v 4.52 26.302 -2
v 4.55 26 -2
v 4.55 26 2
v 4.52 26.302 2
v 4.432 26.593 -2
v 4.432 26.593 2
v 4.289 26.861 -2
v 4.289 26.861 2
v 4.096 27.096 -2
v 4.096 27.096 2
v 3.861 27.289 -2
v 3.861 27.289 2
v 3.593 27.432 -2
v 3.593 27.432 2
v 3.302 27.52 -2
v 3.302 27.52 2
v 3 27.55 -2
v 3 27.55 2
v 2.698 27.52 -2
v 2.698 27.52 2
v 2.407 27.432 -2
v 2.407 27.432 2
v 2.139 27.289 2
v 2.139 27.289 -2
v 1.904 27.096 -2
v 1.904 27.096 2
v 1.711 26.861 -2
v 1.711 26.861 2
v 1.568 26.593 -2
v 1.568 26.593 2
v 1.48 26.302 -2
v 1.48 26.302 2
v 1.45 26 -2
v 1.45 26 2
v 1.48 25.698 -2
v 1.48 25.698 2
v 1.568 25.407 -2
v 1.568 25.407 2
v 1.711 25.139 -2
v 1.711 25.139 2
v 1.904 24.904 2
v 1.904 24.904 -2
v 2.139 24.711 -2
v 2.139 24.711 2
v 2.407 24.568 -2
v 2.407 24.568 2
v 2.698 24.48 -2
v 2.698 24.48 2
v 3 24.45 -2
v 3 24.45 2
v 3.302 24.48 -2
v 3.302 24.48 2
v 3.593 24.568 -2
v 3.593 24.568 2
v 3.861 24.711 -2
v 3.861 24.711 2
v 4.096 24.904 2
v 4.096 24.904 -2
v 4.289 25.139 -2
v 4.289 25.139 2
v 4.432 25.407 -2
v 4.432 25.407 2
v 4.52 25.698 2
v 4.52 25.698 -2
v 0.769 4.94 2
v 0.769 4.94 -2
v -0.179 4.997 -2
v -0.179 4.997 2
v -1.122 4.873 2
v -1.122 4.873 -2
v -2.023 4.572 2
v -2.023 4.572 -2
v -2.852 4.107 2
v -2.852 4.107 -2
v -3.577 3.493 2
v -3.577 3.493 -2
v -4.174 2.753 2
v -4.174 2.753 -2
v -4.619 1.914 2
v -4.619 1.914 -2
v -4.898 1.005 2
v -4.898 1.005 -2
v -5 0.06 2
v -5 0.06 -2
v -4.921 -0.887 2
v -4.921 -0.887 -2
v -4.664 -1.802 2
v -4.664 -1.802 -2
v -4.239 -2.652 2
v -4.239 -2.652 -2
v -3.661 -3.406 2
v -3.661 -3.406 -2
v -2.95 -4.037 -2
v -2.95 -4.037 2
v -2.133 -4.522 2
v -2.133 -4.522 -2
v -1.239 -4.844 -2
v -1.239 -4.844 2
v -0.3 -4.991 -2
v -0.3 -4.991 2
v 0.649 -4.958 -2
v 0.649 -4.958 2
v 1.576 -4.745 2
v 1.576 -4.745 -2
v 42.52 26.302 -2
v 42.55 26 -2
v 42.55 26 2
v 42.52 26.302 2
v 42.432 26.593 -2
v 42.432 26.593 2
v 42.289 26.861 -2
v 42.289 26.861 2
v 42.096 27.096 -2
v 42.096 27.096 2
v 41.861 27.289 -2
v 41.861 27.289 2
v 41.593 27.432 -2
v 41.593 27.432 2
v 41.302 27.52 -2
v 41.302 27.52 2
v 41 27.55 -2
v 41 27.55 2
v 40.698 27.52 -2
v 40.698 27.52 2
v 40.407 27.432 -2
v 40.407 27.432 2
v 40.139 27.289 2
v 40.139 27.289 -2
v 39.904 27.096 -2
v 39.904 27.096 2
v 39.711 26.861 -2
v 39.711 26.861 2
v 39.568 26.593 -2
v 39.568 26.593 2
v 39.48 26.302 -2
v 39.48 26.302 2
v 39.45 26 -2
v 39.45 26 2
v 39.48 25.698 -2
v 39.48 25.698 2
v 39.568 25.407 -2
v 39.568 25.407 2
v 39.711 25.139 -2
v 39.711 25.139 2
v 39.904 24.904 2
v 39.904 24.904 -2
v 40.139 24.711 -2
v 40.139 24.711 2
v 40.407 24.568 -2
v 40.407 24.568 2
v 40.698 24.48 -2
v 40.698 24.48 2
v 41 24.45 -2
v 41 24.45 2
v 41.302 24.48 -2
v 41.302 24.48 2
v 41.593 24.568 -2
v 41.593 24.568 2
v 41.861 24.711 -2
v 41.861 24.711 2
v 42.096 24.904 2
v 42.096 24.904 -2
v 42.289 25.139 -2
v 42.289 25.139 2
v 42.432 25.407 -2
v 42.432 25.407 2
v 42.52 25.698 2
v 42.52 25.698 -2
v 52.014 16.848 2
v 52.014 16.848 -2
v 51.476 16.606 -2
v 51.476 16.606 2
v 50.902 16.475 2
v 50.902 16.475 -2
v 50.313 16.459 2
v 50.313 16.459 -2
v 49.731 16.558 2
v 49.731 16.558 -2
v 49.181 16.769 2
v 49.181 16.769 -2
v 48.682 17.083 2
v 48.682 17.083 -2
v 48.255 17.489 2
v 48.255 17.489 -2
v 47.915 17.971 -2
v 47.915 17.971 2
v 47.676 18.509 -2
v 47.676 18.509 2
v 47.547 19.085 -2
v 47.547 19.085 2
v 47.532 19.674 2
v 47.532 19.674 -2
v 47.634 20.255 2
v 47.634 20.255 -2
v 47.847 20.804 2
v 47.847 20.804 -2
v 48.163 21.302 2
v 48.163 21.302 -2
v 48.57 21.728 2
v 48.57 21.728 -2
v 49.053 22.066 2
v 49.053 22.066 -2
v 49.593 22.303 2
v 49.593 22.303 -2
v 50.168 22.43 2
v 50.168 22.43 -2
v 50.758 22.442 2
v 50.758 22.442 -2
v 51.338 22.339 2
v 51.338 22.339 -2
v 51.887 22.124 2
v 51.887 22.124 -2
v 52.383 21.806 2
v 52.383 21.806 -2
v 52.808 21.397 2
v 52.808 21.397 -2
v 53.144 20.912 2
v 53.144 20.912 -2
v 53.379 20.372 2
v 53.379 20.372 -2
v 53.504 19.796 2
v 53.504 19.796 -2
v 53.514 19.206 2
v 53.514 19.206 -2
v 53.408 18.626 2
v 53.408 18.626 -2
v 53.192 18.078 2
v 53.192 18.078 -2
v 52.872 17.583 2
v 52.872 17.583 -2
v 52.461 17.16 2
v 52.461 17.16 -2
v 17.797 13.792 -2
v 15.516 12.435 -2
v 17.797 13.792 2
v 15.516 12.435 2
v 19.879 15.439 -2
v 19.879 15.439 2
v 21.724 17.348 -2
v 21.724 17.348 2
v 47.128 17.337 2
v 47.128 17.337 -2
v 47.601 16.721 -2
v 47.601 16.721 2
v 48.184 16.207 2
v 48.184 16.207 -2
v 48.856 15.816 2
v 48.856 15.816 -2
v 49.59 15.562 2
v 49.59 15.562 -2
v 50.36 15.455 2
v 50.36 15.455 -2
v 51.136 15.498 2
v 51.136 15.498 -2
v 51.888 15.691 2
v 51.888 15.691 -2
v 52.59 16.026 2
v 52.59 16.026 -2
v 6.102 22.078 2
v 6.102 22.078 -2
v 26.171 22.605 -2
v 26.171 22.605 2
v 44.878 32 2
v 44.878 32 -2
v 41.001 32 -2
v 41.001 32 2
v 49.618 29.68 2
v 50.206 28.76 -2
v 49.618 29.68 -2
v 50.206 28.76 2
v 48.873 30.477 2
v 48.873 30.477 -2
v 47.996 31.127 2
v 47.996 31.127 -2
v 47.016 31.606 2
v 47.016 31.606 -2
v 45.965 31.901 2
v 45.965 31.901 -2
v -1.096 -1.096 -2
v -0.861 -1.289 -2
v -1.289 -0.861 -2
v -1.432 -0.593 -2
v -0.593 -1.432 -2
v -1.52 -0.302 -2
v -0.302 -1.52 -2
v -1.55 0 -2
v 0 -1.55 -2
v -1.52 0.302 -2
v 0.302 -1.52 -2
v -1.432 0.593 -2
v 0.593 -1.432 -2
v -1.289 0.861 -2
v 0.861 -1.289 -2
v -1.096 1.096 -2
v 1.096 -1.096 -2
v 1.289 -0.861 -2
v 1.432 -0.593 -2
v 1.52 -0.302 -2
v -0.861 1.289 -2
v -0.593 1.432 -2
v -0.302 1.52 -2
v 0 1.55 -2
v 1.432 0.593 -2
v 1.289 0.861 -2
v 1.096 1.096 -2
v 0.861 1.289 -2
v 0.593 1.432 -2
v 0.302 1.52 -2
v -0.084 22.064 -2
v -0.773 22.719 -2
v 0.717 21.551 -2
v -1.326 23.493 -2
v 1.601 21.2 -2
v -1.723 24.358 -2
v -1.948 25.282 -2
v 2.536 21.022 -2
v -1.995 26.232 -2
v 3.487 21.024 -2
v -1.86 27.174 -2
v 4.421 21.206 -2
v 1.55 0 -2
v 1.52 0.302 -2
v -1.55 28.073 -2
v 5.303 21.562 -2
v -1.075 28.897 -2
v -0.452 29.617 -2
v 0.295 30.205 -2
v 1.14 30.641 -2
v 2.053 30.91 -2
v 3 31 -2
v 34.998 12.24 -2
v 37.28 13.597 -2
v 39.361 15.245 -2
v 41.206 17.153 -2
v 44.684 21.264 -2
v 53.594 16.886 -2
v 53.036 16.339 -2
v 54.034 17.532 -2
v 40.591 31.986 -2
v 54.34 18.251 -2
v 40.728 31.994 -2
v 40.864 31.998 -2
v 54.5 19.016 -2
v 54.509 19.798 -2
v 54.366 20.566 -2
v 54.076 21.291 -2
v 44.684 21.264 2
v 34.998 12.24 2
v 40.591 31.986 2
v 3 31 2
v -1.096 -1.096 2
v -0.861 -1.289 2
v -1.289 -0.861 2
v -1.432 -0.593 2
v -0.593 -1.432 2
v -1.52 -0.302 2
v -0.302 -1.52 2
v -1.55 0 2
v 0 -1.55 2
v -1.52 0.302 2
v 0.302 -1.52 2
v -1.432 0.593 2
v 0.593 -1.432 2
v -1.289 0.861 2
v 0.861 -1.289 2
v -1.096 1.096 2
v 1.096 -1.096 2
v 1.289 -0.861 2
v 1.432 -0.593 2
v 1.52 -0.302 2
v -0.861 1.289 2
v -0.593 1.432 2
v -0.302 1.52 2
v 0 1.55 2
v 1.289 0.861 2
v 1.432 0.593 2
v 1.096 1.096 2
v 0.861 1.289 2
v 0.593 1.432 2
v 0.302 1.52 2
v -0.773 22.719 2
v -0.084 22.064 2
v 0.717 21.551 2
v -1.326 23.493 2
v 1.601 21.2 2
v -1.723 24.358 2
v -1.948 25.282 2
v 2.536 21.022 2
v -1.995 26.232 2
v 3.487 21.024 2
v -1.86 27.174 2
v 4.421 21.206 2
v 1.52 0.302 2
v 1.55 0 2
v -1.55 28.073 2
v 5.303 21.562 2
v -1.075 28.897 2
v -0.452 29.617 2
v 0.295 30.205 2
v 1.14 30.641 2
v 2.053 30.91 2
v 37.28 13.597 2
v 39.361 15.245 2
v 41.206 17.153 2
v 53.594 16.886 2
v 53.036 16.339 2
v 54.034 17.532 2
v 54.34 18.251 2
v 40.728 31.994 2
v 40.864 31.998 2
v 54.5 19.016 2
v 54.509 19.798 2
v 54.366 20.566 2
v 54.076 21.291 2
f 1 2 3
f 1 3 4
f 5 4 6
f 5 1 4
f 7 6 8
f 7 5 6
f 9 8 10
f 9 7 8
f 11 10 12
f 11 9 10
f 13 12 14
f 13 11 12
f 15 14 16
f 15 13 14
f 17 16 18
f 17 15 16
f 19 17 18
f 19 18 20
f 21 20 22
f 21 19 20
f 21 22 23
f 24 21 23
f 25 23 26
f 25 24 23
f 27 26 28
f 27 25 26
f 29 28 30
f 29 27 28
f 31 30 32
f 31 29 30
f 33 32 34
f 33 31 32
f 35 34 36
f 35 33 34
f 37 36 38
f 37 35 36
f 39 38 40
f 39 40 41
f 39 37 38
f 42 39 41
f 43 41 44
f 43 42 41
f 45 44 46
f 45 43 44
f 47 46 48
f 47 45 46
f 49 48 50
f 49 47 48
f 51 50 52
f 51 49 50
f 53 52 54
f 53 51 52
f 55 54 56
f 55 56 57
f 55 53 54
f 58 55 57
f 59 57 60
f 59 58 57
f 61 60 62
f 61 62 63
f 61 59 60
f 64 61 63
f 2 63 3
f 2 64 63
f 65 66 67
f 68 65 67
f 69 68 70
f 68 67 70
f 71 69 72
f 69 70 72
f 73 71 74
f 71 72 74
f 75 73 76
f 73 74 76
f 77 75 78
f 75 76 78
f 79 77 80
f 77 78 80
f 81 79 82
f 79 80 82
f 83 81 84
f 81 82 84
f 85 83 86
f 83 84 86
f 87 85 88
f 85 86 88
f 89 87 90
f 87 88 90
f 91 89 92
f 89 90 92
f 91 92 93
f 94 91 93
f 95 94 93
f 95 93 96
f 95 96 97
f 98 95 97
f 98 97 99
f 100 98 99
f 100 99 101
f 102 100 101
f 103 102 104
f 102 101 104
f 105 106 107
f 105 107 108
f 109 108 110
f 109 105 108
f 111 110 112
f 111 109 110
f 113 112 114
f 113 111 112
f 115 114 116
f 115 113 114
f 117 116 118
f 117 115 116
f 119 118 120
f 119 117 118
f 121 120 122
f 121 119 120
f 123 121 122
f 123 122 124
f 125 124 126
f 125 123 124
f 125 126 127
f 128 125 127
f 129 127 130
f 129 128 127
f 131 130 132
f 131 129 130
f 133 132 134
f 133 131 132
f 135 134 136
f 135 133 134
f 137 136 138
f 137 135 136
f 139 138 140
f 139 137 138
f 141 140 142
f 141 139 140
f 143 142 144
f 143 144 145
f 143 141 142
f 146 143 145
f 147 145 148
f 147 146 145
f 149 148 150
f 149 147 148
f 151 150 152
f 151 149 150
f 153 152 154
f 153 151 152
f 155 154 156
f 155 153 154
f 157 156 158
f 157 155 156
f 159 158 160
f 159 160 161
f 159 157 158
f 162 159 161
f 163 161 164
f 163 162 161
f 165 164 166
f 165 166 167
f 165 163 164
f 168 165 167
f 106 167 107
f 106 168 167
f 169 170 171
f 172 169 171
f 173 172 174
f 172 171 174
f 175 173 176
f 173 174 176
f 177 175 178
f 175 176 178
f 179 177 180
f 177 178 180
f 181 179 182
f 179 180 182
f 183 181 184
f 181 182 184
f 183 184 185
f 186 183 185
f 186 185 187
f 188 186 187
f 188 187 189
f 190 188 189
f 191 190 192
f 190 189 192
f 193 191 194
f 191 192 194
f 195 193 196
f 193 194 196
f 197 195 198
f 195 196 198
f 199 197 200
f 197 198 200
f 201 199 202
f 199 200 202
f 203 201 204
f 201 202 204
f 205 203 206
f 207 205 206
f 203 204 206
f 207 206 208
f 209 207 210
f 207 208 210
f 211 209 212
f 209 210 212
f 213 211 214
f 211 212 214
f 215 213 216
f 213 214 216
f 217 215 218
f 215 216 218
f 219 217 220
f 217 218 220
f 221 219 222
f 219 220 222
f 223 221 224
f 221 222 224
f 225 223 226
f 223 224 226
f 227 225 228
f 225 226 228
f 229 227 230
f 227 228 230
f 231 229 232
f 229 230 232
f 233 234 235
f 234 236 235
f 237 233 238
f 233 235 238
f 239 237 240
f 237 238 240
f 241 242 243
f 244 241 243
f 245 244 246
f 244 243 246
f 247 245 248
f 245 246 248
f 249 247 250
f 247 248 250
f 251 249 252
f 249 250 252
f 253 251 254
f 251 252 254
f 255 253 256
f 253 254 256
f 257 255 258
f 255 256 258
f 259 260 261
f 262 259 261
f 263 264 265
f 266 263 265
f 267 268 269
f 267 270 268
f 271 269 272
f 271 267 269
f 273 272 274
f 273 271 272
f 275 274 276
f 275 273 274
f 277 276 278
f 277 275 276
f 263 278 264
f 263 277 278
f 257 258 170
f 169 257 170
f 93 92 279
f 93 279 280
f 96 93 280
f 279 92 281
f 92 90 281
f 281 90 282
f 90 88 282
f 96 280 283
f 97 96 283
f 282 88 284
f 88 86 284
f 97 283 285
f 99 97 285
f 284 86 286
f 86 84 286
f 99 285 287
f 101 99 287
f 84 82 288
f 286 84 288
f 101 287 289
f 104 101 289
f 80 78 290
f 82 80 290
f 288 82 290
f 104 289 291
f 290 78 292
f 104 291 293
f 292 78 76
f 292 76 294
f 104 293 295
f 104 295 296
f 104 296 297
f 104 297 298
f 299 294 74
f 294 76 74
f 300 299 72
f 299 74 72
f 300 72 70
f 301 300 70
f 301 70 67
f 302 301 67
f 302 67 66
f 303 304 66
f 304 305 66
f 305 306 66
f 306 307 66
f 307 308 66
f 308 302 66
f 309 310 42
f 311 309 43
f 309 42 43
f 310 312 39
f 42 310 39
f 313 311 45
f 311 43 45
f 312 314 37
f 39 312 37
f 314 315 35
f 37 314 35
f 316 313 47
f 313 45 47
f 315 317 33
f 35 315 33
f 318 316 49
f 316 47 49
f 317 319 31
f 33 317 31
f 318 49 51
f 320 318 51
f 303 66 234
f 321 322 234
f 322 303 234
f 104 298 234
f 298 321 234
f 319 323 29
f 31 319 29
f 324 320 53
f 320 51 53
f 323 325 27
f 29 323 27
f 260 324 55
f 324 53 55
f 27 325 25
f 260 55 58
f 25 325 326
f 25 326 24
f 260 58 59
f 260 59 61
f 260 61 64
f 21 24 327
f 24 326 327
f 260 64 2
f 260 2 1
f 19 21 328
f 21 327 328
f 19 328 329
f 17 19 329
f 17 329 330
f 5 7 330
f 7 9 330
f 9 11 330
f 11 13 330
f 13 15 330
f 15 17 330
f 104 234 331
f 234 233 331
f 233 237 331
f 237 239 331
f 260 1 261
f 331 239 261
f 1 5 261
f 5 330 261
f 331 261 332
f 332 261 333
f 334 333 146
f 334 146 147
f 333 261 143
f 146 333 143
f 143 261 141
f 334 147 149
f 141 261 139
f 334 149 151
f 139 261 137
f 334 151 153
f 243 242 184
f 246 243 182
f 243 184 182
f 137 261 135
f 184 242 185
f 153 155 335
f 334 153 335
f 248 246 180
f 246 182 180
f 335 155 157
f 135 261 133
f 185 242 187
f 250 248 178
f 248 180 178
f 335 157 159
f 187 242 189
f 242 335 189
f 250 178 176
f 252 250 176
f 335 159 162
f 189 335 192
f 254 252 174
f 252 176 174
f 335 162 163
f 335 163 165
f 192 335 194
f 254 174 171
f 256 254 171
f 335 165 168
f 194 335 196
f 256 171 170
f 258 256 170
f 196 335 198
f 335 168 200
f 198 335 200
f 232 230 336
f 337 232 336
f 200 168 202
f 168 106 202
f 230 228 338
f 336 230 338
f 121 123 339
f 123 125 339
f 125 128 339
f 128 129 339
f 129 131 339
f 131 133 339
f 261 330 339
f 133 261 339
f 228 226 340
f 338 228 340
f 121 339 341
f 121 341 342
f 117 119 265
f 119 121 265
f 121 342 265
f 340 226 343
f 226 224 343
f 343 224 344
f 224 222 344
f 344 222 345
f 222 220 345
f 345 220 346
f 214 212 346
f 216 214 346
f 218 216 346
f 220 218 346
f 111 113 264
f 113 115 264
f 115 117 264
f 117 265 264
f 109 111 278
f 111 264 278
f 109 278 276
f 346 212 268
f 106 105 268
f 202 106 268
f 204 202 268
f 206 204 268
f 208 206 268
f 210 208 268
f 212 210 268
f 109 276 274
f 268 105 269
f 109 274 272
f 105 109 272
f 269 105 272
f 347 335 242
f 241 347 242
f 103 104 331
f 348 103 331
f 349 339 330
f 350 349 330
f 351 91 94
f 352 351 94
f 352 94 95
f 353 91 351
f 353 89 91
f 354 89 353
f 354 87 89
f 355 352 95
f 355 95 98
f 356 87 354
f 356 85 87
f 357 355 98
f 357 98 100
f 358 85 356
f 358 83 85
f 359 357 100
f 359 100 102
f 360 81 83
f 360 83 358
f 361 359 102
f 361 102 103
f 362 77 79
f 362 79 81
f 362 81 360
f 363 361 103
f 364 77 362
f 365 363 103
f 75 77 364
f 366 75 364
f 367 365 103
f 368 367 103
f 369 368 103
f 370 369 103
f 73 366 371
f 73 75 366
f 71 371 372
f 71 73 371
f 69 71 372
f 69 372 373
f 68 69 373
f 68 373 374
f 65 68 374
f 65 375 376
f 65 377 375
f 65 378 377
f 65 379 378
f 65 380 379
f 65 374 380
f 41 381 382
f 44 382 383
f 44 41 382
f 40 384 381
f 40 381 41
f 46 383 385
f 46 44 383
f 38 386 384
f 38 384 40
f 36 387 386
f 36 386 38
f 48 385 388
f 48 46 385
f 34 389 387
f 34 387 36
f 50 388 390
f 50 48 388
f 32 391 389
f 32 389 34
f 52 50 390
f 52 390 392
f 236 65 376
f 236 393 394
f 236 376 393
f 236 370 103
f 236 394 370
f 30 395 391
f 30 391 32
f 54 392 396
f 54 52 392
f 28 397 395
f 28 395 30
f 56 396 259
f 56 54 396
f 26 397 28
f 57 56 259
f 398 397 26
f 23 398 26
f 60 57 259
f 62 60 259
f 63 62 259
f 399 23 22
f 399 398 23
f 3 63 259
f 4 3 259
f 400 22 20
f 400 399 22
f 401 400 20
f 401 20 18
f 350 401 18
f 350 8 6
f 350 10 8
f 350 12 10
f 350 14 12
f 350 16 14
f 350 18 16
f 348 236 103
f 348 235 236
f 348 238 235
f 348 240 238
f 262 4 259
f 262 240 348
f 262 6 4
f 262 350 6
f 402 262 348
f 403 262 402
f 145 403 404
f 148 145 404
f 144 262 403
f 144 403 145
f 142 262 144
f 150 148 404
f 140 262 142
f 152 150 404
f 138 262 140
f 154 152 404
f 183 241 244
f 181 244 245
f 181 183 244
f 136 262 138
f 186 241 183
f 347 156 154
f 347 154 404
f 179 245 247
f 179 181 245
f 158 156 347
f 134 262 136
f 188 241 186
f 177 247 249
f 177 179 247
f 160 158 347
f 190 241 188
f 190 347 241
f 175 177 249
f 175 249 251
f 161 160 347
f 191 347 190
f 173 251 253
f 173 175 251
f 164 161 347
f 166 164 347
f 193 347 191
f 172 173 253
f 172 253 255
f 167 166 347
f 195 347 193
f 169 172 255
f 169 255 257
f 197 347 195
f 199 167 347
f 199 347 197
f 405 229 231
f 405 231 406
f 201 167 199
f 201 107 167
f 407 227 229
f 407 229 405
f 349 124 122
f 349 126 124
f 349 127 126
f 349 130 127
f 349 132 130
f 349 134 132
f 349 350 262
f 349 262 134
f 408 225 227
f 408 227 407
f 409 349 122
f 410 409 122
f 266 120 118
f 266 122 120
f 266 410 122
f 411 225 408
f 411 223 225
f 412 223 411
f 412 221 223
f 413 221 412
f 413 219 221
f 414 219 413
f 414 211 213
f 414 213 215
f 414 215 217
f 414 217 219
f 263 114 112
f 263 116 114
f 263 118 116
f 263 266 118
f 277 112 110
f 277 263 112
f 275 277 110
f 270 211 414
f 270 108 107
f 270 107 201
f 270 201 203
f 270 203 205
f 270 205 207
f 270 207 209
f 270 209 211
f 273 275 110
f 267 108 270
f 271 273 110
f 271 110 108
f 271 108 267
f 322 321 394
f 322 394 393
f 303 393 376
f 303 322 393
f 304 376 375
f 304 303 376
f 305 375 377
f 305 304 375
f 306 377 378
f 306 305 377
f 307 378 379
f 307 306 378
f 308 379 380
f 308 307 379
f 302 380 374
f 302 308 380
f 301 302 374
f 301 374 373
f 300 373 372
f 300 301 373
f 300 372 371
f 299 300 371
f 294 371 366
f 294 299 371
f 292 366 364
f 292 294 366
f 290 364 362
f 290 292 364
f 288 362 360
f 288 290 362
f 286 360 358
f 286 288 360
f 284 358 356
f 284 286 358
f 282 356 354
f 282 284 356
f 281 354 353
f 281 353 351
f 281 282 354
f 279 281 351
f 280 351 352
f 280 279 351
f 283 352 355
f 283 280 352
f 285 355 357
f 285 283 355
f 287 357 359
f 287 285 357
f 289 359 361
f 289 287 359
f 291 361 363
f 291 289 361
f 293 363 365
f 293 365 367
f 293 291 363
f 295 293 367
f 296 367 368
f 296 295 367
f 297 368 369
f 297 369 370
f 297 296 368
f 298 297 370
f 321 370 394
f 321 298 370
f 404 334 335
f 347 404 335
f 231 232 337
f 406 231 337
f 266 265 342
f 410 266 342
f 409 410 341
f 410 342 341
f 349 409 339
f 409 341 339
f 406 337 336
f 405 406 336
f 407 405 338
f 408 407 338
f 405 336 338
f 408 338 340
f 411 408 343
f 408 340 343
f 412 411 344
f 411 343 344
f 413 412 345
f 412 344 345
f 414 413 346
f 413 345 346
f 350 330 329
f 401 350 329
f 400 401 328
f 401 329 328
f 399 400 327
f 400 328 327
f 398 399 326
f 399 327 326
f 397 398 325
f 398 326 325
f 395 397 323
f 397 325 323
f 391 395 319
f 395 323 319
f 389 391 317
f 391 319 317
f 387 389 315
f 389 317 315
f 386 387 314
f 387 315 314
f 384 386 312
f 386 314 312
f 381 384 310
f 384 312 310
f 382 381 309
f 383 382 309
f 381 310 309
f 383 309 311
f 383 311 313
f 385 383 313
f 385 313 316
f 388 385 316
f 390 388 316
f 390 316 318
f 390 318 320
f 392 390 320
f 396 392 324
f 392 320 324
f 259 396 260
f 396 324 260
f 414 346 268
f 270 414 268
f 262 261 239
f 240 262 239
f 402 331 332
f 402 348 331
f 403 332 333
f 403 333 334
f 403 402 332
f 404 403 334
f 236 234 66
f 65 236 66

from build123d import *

# Parameters (mm, degrees)
BOSS_EXTRUDE1_DEPTH      = 2
BOSS_EXTRUDE1_DEPTH_BACK = 2
SKETCH2_R                = 1.55
FILLET1_R                = 20
BOSS_EXTRUDE3_START      = -4
BOSS_EXTRUDE3_DEPTH      = 4
FILLET3_R                = 6


with BuildPart() as part:
    # Sketch2 → Boss-Extrude1 (new, two sides: drawn at the far end of the back side and taken through both)
    with BuildSketch(Plane.XY.offset(-BOSS_EXTRUDE1_DEPTH_BACK)):
        with BuildLine():
            Line((1.575752274, -4.745208612), (38.598254294, 14.069940073))
            Line((38.598254294, 14.069940073), (44.683748534, 21.26396825))
            ThreePointArc((44.683748534, 21.26396825), (46.605489471, 28.139740122), (40.590896347, 31.986036602))
            Line((40.590896347, 31.986036602), (3, 31))
            ThreePointArc((3, 31), (-1.722747684, 24.35815521), (6.101607472, 22.078261726))
            Line((6.101607472, 22.078261726), (26.170960727, 22.604695486))
            Line((26.170960727, 22.604695486), (19.115779569, 14.264342174))
            Line((19.115779569, 14.264342174), (0.76923556, 4.940473323))
            ThreePointArc((0.76923556, 4.940473323), (-4.982755324, -0.41490888), (1.575752274, -4.745208612))
        make_face()
        Circle(SKETCH2_R, mode=Mode.SUBTRACT)
        with Locations((41, 26)):
            Circle(SKETCH2_R, mode=Mode.SUBTRACT)
        with Locations((3, 26)):
            Circle(SKETCH2_R, mode=Mode.SUBTRACT)
    extrude(amount=BOSS_EXTRUDE1_DEPTH + BOSS_EXTRUDE1_DEPTH_BACK)

    # Fillet1
    fillet1_edges = [part.edges().sort_by_distance(p)[0] for p in [
        (38.598254294, 14.069940073, 0),
        (19.115779569, 14.264342174, 0),
    ]]
    fillet(fillet1_edges, radius=FILLET1_R)

    # Sketch4 → Boss-Extrude3 (add)
    with BuildSketch(Plane.XY.offset(2).offset(BOSS_EXTRUDE3_START)):
        with BuildLine():
            Line((44.683748534, 21.26396825), (47.128315366, 17.33721301))
            ThreePointArc((47.128315366, 17.33721301), (49.590140611, 15.561753741), (52.589716544, 16.025847893))
            Line((52.589716544, 16.025847893), (52.014355474, 16.847548658))
            ThreePointArc((52.014355474, 16.847548658), (48.803326553, 21.908657431), (52.460976548, 17.160276102))
            Line((52.460976548, 17.160276102), (53.036337618, 16.338575336))
            ThreePointArc((53.036337618, 16.338575336), (54.438800344, 18.629754015), (54.07561509, 21.291426028))
            Line((54.07561509, 21.291426028), (48.52701486, 31.999999837))
            Line((48.52701486, 31.999999837), (41.001398133, 31.999999837))
            ThreePointArc((41.001398133, 31.999999837), (46.67544448, 27.946620135), (44.683748534, 21.26396825))
        make_face()
    extrude(amount=BOSS_EXTRUDE3_DEPTH)

    # Fillet3
    fillet3_edges = [part.edges().sort_by_distance(p)[0] for p in [
        (48.52701486, 31.999999837, 0),
    ]]
    fillet(fillet3_edges, radius=FILLET3_R)


solid = part.part
